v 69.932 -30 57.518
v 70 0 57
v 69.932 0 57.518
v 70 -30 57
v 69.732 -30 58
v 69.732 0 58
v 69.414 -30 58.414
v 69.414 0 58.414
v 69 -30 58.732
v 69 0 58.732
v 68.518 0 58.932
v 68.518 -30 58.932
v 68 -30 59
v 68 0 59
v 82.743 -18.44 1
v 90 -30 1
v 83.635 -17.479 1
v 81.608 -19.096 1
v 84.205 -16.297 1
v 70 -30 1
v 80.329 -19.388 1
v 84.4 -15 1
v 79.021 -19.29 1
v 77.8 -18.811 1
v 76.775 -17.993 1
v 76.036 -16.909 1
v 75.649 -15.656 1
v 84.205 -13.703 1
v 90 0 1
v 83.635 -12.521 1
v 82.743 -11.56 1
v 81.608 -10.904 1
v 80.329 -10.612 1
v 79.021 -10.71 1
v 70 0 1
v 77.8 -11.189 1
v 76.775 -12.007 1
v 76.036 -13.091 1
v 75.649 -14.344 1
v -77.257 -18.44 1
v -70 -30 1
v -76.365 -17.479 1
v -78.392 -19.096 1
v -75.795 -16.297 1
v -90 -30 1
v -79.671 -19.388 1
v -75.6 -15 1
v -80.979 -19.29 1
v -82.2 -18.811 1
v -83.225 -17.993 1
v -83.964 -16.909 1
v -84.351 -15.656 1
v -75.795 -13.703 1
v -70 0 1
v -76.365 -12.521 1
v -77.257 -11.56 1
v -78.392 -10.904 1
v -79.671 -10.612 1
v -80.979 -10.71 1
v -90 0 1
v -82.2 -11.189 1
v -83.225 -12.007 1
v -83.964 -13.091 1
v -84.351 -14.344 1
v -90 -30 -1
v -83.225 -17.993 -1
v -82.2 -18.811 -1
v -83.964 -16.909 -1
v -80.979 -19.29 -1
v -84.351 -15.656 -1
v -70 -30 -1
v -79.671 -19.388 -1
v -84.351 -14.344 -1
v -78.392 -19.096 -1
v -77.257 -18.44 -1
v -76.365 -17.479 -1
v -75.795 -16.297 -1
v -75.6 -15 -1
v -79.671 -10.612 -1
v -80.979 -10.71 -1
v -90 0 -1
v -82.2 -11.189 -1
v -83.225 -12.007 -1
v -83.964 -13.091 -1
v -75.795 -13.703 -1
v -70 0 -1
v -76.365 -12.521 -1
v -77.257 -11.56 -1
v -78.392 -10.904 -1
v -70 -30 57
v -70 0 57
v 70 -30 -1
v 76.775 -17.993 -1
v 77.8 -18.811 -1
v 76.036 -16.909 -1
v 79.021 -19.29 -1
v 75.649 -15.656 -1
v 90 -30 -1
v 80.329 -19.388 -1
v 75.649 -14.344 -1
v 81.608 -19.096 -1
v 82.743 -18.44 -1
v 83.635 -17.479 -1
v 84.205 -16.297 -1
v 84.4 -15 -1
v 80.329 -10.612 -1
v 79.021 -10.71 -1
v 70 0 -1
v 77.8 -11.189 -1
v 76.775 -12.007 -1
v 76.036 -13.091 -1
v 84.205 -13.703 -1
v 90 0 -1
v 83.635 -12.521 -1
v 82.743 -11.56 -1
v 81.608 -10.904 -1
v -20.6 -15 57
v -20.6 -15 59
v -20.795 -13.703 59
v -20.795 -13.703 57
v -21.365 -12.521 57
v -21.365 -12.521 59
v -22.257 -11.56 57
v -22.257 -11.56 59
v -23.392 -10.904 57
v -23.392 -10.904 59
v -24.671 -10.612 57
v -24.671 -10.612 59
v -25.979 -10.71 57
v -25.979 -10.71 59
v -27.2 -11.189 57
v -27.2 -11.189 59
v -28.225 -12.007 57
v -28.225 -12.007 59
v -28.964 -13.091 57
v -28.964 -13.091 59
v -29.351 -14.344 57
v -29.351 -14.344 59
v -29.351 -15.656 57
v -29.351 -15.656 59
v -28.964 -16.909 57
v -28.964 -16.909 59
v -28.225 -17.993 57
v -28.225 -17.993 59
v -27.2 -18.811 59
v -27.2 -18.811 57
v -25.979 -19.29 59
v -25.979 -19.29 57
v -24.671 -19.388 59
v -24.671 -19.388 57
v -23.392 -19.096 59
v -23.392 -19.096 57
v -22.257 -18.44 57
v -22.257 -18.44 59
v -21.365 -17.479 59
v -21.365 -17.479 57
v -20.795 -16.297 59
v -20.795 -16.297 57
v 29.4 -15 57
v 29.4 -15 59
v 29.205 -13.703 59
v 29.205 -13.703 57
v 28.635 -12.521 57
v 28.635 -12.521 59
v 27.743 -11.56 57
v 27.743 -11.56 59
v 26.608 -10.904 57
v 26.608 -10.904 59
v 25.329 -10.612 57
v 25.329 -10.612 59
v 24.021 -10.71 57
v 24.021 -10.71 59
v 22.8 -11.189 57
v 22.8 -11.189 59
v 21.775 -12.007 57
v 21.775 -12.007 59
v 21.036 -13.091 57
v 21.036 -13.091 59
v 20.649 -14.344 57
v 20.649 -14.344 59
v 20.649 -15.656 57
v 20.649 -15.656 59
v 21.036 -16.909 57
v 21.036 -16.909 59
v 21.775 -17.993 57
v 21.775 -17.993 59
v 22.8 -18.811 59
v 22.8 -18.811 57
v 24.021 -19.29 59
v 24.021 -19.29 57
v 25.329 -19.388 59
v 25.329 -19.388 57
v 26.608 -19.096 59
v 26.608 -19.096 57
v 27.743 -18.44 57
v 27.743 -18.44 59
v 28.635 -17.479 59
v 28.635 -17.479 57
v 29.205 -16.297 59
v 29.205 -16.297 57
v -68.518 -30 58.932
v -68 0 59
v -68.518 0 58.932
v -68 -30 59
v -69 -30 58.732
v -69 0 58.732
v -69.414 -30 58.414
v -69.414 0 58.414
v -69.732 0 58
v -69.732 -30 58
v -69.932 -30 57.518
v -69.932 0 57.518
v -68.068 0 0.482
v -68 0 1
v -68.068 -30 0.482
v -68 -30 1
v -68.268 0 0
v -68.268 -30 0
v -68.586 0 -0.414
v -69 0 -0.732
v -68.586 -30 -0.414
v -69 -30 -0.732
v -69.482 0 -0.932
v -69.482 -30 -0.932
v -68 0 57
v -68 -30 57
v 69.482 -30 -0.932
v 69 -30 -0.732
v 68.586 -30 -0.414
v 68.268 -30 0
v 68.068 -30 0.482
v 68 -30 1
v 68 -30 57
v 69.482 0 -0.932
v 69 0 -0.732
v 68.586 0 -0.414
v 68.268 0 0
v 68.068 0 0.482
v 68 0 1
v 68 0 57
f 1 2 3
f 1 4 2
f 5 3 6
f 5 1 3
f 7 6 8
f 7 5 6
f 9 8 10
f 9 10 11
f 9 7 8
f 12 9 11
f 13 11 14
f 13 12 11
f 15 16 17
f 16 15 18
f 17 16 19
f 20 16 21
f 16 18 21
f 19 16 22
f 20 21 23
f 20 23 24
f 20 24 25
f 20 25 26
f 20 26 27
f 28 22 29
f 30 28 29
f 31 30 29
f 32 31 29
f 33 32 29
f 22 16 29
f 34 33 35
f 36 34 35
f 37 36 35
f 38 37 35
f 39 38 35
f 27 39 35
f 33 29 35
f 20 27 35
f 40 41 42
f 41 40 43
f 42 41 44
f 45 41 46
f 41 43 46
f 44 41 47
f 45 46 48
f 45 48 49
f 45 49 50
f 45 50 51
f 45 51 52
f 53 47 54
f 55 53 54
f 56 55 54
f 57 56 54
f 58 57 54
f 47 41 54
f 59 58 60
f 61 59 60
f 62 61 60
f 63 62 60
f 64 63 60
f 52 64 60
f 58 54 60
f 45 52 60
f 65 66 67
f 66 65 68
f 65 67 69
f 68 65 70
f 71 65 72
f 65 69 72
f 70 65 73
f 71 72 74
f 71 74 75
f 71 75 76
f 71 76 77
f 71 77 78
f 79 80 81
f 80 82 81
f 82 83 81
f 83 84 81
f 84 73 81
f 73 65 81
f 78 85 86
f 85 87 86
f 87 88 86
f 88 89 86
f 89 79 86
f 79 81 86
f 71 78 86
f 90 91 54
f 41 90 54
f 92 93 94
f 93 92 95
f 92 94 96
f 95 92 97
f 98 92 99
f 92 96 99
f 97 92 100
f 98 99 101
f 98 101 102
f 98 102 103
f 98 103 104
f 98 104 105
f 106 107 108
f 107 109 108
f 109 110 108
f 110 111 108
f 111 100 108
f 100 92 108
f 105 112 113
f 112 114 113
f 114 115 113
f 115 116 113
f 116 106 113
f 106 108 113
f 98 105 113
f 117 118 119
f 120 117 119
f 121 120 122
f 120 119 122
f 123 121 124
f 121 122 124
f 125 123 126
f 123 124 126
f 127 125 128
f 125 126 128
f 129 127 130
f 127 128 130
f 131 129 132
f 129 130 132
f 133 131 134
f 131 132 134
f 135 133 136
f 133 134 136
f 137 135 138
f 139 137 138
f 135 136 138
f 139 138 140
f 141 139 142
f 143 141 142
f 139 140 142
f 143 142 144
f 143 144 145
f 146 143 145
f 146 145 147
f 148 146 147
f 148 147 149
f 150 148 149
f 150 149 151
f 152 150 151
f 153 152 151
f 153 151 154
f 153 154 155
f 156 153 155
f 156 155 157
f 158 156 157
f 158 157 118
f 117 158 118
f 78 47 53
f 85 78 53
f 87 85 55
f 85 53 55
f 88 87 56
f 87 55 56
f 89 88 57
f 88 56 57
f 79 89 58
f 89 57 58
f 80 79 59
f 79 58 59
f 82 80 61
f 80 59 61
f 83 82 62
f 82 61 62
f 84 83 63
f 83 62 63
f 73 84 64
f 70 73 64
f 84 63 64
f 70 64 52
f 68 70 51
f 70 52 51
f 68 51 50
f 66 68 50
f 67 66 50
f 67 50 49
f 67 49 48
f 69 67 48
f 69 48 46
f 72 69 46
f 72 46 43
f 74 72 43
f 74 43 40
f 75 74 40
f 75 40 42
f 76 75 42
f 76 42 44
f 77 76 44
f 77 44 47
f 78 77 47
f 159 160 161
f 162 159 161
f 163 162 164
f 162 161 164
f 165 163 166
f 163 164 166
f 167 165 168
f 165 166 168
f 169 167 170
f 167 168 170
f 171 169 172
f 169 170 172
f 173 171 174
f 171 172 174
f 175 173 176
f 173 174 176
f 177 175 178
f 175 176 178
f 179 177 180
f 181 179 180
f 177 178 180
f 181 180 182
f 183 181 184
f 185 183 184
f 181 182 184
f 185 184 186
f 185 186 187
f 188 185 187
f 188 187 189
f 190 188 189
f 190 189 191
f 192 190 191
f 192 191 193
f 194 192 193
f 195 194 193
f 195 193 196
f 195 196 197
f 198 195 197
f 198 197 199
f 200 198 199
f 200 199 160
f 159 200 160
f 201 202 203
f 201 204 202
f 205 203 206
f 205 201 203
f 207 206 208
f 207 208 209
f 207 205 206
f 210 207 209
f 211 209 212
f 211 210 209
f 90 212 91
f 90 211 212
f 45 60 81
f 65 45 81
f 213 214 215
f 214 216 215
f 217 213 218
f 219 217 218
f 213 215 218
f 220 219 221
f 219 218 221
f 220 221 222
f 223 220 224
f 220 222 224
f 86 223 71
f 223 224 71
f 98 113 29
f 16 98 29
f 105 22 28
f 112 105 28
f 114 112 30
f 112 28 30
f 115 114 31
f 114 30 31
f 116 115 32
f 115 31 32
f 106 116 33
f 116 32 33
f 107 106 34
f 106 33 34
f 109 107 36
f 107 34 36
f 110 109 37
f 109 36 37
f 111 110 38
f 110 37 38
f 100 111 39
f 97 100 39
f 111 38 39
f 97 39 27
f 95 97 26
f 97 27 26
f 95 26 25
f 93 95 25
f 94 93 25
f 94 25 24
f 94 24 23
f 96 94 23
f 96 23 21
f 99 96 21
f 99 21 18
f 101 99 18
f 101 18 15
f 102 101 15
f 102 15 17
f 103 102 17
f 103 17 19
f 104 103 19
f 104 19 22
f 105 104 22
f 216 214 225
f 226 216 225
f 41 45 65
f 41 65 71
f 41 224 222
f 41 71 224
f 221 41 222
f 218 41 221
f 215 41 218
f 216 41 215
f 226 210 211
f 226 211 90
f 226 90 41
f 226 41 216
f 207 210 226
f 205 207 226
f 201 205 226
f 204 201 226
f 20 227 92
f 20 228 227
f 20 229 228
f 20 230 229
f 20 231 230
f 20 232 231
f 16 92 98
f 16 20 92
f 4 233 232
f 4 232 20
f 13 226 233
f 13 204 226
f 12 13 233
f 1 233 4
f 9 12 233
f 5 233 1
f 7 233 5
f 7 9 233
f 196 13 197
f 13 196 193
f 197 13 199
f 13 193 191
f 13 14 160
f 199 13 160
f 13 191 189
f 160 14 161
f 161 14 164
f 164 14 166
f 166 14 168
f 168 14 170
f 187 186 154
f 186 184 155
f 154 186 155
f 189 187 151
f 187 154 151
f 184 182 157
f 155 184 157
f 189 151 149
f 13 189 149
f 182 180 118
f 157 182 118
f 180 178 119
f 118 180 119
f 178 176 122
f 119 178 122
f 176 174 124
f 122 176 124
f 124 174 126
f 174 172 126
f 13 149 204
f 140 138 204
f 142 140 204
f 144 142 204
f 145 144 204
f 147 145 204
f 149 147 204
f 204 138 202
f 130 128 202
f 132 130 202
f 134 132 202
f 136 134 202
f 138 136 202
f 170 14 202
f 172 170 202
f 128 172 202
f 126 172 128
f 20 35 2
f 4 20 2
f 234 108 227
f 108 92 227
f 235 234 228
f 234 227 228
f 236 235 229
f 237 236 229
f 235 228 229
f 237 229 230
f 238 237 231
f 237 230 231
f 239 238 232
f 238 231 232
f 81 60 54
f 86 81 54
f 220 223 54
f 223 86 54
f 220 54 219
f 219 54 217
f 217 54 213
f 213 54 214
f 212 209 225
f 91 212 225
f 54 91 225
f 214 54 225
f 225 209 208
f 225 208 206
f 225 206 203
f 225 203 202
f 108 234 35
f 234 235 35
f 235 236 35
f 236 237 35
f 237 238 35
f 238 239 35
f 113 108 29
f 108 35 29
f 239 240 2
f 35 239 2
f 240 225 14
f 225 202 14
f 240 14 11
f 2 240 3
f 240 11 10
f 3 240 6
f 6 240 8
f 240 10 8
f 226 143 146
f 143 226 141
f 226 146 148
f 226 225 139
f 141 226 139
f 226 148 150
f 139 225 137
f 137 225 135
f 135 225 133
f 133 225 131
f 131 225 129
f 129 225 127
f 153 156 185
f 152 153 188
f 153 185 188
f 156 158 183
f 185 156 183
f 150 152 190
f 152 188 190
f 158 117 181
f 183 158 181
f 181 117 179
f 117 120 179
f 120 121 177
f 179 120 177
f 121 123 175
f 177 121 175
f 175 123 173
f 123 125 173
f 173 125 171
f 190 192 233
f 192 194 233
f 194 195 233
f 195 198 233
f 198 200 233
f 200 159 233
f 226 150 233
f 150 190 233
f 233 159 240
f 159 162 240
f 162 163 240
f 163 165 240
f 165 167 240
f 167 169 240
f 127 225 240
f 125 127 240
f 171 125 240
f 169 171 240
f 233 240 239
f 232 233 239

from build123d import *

# Parameters (mm, degrees)
F1_DEPTH = 30
F2_R     = 4.4
F3_R     = 4.4
F4_DEPTH = 25
F5_R     = 2
F6_R     = 2


# Not quite as in the source:
# - a feature names something its author has since deleted; it is built from what else it names


with BuildPart() as f1:
    # F0 (on Front) → F1 (new body)
    with BuildSketch(Plane.XZ):
        Polygon((90, -1), (90, 1), (70, 1), (70, 59), (-70, 59), (-70, 1), (-90, 1), (-90, -1), (-68, -1), (-68, 57), (68, 57), (68, -1), align=None)
    extrude(amount=F1_DEPTH)

    # F2 (on face) + F3 (on face) → F4 (cut)
    with BuildSketch(Plane.XY.offset(1)):
        with Locations((-80, -15)):
            Circle(F2_R)
        with Locations((80, -15)):
            Circle(F2_R)
    with BuildSketch(Plane.XY.offset(59)):
        with Locations((-25, -15)):
            Circle(F3_R)
        with Locations((25, -15)):
            Circle(F3_R)
    extrude(amount=-F4_DEPTH, mode=Mode.SUBTRACT)

    # F5
    f5_edges = [f1.edges().sort_by_distance(p)[0] for p in [
        (-70, -15, 59),
        (70, -15, 59),
    ]]
    fillet(f5_edges, radius=F5_R)

    # F6
    f6_edges = [f1.edges().sort_by_distance(p)[0] for p in [
        (68, -15, -1),
        (-68, -15, -1),
    ]]
    fillet(f6_edges, radius=F6_R)


solid = f1.part
